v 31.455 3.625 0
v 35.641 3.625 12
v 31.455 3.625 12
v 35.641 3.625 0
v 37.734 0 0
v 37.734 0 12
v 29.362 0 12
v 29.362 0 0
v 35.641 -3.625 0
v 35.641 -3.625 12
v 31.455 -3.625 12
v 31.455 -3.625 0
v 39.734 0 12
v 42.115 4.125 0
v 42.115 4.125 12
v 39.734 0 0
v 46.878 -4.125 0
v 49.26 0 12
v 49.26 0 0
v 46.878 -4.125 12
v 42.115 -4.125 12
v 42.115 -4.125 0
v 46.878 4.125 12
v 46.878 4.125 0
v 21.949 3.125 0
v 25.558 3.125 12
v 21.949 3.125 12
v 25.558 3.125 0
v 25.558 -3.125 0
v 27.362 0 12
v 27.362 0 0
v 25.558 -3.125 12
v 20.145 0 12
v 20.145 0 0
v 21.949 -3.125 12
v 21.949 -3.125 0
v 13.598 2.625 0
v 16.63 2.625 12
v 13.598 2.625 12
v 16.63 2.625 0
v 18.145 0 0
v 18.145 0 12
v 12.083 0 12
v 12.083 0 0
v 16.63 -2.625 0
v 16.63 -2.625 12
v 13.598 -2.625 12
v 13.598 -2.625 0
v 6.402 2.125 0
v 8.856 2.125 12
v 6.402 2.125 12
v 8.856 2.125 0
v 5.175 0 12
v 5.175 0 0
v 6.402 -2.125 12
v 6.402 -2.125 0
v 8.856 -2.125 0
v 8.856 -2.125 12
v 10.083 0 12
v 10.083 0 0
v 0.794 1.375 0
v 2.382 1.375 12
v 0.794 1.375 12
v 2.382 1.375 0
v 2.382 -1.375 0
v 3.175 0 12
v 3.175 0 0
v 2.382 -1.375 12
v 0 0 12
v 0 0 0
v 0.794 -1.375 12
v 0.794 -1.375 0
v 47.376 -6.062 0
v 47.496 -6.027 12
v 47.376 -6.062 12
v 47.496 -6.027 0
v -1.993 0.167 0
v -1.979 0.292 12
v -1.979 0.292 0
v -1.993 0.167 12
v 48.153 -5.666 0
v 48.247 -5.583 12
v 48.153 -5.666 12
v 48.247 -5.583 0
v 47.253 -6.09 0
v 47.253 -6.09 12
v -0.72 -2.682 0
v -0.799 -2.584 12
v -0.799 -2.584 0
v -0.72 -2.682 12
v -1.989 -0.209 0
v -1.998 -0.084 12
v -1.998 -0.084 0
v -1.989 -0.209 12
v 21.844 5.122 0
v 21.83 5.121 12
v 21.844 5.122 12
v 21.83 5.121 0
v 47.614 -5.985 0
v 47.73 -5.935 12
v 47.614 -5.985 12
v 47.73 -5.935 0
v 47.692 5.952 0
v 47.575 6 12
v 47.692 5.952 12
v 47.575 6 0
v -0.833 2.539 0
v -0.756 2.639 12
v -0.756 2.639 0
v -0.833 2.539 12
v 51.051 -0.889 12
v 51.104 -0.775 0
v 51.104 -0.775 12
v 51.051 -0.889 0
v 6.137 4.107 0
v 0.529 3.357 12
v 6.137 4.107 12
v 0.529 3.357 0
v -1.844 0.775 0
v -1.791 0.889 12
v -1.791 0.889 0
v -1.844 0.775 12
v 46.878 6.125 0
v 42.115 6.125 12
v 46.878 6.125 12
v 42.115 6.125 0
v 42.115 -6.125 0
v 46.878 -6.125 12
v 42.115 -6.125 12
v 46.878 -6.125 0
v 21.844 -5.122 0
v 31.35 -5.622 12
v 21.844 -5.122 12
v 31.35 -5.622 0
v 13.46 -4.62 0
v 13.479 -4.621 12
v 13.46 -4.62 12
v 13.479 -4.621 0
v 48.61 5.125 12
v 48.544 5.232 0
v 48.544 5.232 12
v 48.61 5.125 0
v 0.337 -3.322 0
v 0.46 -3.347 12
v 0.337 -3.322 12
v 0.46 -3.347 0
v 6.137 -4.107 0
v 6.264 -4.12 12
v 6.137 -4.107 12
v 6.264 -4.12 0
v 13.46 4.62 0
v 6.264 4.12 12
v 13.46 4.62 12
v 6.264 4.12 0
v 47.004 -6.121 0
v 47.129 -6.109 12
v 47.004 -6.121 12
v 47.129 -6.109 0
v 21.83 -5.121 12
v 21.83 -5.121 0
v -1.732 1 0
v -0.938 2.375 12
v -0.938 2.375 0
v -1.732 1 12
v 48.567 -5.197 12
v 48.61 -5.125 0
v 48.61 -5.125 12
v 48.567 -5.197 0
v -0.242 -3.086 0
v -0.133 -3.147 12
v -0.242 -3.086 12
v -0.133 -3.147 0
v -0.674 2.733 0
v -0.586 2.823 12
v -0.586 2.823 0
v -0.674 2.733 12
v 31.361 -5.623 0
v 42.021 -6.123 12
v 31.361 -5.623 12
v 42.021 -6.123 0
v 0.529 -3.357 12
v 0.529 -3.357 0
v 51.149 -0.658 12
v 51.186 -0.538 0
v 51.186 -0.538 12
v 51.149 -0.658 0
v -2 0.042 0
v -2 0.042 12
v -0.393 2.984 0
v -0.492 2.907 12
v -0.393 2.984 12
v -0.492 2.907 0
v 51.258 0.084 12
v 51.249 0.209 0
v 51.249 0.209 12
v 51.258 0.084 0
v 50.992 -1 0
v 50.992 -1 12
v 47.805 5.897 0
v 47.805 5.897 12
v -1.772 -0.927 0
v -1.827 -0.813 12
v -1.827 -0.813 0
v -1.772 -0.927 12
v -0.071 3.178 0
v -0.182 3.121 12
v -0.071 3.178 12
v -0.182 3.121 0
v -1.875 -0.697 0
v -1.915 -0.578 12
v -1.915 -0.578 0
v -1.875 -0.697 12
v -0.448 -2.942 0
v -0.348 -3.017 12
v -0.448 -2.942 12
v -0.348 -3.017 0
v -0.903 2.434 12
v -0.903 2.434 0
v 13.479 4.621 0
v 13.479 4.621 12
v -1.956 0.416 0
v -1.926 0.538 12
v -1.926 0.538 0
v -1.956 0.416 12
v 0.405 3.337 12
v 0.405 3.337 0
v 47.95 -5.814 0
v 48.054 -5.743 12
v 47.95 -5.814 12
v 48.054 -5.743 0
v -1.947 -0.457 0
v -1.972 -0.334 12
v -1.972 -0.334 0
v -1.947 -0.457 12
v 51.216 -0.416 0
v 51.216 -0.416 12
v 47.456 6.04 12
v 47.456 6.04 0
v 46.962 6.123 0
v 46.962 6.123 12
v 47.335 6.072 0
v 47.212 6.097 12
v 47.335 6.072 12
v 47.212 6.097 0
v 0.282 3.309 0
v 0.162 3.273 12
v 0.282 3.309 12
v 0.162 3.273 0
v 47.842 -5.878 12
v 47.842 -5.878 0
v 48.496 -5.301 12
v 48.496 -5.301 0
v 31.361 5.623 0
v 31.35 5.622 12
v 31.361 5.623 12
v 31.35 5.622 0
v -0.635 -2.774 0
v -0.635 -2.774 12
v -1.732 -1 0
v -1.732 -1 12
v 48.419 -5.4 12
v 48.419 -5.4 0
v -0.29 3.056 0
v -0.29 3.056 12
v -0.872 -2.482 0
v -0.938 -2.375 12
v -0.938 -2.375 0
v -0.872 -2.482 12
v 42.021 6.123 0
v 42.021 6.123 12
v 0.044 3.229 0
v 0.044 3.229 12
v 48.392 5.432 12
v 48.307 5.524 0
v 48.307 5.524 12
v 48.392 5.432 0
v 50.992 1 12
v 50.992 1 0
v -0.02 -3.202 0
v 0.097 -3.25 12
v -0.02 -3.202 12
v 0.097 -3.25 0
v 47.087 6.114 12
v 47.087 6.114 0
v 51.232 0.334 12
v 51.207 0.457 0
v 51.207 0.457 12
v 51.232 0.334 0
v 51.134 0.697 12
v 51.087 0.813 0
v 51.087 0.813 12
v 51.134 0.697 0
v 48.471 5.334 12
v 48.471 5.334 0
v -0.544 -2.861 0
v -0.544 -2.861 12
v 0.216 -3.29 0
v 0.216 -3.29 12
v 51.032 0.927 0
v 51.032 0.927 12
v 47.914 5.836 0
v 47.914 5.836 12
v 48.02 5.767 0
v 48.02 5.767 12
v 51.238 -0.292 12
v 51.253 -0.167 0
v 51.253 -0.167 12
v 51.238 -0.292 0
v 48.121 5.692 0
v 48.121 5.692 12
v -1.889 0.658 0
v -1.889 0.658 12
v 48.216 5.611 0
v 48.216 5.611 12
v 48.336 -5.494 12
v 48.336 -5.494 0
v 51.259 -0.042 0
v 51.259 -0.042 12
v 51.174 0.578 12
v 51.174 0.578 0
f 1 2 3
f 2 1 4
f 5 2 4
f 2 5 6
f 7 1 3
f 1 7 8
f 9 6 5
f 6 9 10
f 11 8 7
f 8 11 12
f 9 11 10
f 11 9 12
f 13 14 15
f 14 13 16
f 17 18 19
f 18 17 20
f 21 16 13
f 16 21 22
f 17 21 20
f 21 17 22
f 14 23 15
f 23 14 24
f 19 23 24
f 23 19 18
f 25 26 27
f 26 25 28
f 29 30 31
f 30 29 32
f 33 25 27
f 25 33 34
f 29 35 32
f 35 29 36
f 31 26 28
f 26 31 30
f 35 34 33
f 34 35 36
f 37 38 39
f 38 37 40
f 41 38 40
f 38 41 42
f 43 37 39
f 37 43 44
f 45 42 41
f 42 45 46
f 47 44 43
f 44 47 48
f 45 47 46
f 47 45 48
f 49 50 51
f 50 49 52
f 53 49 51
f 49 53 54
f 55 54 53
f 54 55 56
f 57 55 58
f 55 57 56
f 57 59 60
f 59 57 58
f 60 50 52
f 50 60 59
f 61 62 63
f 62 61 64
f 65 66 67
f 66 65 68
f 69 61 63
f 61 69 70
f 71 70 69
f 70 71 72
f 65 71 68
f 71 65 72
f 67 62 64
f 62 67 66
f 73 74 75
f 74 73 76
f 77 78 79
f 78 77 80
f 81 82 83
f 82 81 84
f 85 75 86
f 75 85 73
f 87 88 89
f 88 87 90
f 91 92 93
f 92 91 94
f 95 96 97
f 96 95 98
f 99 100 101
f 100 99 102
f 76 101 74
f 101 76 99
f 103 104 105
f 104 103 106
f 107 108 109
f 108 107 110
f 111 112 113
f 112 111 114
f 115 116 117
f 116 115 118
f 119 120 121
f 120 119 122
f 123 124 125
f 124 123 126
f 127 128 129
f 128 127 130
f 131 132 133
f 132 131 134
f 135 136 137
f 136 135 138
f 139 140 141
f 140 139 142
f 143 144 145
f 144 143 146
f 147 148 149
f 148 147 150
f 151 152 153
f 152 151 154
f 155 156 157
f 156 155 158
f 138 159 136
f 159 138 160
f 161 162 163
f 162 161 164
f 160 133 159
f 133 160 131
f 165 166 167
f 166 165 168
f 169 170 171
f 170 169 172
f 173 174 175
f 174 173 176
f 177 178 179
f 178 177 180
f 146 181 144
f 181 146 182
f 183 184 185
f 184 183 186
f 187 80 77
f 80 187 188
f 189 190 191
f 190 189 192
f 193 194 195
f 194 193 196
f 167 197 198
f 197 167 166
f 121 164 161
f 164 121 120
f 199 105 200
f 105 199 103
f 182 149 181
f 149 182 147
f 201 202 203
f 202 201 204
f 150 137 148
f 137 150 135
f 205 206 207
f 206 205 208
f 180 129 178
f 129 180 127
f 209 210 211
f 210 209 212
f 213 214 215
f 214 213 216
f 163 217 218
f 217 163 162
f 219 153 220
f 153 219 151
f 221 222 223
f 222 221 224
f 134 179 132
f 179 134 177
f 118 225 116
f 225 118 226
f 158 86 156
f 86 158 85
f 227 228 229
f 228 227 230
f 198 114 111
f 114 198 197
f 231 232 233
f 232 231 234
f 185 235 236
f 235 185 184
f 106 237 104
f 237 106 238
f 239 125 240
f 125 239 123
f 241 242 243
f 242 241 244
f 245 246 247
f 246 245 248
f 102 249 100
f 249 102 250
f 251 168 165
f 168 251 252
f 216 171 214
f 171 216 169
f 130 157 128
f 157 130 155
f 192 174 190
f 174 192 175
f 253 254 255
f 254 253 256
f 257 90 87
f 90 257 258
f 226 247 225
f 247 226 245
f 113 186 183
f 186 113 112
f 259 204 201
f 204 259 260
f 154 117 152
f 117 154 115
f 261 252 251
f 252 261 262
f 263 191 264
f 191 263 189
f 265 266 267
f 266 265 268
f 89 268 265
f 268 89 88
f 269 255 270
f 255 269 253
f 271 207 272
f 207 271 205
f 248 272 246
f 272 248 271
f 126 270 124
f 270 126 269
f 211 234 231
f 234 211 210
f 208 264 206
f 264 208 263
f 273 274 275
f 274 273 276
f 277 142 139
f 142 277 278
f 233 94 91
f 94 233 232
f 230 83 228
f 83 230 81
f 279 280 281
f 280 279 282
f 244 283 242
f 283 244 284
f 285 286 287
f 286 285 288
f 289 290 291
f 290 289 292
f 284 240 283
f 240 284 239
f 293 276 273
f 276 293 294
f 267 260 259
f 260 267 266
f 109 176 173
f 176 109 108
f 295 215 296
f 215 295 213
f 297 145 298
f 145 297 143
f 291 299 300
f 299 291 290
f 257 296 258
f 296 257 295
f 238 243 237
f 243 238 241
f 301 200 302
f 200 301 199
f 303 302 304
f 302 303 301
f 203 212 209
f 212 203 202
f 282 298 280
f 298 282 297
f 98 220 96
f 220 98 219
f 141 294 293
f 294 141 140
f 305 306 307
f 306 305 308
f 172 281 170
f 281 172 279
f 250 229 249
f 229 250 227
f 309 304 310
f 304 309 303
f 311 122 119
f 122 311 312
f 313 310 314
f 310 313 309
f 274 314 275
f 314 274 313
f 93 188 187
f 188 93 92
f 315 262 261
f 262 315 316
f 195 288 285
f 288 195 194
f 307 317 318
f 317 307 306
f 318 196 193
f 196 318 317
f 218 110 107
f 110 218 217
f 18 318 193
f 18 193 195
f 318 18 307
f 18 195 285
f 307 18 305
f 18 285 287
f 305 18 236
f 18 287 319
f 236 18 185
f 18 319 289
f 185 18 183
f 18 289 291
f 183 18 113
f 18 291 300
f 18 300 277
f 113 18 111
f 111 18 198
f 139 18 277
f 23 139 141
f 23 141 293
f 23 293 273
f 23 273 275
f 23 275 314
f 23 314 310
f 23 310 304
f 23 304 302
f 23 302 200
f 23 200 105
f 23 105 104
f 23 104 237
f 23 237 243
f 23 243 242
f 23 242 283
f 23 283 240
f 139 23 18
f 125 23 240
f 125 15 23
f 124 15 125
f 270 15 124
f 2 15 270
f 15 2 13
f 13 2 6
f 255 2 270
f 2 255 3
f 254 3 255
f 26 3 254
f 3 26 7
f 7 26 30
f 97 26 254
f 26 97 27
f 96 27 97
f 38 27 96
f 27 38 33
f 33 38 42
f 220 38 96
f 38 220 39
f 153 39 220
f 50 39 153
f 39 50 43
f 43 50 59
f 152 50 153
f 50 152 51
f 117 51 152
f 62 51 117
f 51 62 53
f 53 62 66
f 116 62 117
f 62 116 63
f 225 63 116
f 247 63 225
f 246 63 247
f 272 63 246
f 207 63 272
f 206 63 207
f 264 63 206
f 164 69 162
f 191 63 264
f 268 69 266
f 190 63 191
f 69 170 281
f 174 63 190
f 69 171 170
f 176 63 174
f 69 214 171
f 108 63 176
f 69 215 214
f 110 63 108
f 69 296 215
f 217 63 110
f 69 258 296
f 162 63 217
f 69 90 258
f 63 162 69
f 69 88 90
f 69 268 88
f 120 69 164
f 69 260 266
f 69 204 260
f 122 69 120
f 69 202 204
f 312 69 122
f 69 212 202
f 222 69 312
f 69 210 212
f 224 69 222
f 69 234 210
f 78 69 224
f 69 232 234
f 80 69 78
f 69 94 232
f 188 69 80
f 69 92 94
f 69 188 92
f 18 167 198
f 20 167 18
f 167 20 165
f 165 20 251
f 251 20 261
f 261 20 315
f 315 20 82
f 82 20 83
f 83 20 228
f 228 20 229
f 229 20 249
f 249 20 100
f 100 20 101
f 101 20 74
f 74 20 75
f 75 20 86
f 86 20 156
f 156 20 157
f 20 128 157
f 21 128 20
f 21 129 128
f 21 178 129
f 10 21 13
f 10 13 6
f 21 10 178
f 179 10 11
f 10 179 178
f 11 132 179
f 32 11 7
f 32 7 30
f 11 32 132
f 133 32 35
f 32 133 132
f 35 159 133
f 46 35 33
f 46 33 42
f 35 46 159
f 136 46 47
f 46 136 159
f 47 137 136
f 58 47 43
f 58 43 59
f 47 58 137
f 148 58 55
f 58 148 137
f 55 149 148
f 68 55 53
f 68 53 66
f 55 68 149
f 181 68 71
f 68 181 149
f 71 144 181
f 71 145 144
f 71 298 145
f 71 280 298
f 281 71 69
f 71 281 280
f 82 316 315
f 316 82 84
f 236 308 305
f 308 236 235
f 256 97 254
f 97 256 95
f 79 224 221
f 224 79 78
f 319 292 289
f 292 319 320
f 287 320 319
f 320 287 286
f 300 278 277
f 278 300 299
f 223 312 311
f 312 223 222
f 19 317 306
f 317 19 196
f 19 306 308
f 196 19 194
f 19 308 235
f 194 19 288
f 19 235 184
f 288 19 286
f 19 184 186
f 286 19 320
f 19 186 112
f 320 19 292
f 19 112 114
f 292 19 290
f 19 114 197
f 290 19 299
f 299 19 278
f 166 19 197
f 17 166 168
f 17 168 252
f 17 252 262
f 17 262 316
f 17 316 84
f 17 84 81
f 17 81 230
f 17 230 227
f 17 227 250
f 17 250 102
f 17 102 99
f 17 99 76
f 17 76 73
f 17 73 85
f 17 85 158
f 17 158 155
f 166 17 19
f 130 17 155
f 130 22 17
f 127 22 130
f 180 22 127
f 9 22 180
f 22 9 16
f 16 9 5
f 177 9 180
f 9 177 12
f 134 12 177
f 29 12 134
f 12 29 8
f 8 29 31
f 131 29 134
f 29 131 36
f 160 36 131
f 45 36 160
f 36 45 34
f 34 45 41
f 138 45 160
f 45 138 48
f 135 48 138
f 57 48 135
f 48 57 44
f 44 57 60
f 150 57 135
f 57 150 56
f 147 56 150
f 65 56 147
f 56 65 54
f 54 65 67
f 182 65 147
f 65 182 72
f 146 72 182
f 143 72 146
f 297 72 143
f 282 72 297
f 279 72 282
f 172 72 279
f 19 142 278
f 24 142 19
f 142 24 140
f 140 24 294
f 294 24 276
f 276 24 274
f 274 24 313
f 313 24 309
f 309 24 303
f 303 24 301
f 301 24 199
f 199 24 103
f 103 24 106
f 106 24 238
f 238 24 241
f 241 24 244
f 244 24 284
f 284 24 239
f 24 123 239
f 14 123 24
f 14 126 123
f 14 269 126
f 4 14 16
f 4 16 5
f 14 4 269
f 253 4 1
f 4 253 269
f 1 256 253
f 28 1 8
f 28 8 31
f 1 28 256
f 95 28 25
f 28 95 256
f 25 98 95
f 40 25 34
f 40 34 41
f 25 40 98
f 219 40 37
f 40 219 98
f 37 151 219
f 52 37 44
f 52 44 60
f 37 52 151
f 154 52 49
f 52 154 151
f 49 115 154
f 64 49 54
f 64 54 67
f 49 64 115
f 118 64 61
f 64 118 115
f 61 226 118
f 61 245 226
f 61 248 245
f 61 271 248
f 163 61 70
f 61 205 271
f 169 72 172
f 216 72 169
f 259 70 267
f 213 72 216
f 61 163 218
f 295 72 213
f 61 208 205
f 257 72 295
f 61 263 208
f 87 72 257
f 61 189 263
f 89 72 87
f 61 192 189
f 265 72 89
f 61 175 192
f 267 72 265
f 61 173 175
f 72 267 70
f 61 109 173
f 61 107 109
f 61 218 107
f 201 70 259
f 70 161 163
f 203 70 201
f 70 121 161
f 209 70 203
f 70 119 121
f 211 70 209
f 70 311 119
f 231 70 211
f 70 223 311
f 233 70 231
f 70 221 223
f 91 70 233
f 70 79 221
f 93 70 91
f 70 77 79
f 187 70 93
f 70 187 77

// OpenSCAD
// the sizes of your allen keys (in mm)
// (they should be sorted from lowest to highest)
dias=[2.5,4,5,6,7,8];
// wiggle room for your keys. The lower, the tighter the fit (in mm)
wiggle=0.25;
// how high the keyholder should be (in mm)
height=12;
// wall thickness between the tools (in mm)
minRim=2;
// border width around the tool (in mm)
border=2;
// the basic shape of the tool holder
// can be "cone" or "cuboid"
style = "cone";
// how the keys are oriented inside the holder (in deg)
// 0: keys are facing towards you
// 30: keys are overlapping
// or experiment with anything between
keyOrientation = 0;



// ---
// CALCULATION STARTS HERE
//
// don't change anything below here unless you know what you are doing
// ---

// we were given the diameter of the circle _inside_ the hexagon, but we need to work with the diameter of the circle _around_ the hexagon.
outerDias = [ for (dia = dias) 2/sqrt(3) * (dia+wiggle) ];
Holder();

module HexBore(outerDia) {
    rotate([0,0,keyOrientation]) polygon([
        [outerDia/2*cos(0), outerDia/2*sin(0)],
        [outerDia/2*cos(60), outerDia/2*sin(60)],
        [outerDia/2*cos(120), outerDia/2*sin(120)],
        [outerDia/2*cos(180), outerDia/2*sin(180)],
        [outerDia/2*cos(240), outerDia/2*sin(240)],
        [outerDia/2*cos(300), outerDia/2*sin(300)]
    ]);
}

module HexBores(outerDias=[], xOffset=0) {
    remainder = [for (i=[1:1:len(outerDias)-1]) outerDias[i]];
    dia = outerDias[0];
    xOffset = xOffset + dia/2;
       
    union() {
        translate([xOffset,0,0]) linear_extrude(height=height) HexBore(dia);
        if (len(remainder) > 0) HexBores(remainder, xOffset=xOffset+dia/2+minRim);
    }
}

module Holder($fn=100) {
    difference() {
      linear_extrude(height) offset(border) projection() hull() {
    
        if (style == "cuboid") HexBores([outerDias[len(outerDias)-1]]);
        HexBores(outerDias);
      };
      translate([0,0,-0.1]) scale([1, 1, 2]) HexBores(outerDias);
  }
}

echo(version=version());
